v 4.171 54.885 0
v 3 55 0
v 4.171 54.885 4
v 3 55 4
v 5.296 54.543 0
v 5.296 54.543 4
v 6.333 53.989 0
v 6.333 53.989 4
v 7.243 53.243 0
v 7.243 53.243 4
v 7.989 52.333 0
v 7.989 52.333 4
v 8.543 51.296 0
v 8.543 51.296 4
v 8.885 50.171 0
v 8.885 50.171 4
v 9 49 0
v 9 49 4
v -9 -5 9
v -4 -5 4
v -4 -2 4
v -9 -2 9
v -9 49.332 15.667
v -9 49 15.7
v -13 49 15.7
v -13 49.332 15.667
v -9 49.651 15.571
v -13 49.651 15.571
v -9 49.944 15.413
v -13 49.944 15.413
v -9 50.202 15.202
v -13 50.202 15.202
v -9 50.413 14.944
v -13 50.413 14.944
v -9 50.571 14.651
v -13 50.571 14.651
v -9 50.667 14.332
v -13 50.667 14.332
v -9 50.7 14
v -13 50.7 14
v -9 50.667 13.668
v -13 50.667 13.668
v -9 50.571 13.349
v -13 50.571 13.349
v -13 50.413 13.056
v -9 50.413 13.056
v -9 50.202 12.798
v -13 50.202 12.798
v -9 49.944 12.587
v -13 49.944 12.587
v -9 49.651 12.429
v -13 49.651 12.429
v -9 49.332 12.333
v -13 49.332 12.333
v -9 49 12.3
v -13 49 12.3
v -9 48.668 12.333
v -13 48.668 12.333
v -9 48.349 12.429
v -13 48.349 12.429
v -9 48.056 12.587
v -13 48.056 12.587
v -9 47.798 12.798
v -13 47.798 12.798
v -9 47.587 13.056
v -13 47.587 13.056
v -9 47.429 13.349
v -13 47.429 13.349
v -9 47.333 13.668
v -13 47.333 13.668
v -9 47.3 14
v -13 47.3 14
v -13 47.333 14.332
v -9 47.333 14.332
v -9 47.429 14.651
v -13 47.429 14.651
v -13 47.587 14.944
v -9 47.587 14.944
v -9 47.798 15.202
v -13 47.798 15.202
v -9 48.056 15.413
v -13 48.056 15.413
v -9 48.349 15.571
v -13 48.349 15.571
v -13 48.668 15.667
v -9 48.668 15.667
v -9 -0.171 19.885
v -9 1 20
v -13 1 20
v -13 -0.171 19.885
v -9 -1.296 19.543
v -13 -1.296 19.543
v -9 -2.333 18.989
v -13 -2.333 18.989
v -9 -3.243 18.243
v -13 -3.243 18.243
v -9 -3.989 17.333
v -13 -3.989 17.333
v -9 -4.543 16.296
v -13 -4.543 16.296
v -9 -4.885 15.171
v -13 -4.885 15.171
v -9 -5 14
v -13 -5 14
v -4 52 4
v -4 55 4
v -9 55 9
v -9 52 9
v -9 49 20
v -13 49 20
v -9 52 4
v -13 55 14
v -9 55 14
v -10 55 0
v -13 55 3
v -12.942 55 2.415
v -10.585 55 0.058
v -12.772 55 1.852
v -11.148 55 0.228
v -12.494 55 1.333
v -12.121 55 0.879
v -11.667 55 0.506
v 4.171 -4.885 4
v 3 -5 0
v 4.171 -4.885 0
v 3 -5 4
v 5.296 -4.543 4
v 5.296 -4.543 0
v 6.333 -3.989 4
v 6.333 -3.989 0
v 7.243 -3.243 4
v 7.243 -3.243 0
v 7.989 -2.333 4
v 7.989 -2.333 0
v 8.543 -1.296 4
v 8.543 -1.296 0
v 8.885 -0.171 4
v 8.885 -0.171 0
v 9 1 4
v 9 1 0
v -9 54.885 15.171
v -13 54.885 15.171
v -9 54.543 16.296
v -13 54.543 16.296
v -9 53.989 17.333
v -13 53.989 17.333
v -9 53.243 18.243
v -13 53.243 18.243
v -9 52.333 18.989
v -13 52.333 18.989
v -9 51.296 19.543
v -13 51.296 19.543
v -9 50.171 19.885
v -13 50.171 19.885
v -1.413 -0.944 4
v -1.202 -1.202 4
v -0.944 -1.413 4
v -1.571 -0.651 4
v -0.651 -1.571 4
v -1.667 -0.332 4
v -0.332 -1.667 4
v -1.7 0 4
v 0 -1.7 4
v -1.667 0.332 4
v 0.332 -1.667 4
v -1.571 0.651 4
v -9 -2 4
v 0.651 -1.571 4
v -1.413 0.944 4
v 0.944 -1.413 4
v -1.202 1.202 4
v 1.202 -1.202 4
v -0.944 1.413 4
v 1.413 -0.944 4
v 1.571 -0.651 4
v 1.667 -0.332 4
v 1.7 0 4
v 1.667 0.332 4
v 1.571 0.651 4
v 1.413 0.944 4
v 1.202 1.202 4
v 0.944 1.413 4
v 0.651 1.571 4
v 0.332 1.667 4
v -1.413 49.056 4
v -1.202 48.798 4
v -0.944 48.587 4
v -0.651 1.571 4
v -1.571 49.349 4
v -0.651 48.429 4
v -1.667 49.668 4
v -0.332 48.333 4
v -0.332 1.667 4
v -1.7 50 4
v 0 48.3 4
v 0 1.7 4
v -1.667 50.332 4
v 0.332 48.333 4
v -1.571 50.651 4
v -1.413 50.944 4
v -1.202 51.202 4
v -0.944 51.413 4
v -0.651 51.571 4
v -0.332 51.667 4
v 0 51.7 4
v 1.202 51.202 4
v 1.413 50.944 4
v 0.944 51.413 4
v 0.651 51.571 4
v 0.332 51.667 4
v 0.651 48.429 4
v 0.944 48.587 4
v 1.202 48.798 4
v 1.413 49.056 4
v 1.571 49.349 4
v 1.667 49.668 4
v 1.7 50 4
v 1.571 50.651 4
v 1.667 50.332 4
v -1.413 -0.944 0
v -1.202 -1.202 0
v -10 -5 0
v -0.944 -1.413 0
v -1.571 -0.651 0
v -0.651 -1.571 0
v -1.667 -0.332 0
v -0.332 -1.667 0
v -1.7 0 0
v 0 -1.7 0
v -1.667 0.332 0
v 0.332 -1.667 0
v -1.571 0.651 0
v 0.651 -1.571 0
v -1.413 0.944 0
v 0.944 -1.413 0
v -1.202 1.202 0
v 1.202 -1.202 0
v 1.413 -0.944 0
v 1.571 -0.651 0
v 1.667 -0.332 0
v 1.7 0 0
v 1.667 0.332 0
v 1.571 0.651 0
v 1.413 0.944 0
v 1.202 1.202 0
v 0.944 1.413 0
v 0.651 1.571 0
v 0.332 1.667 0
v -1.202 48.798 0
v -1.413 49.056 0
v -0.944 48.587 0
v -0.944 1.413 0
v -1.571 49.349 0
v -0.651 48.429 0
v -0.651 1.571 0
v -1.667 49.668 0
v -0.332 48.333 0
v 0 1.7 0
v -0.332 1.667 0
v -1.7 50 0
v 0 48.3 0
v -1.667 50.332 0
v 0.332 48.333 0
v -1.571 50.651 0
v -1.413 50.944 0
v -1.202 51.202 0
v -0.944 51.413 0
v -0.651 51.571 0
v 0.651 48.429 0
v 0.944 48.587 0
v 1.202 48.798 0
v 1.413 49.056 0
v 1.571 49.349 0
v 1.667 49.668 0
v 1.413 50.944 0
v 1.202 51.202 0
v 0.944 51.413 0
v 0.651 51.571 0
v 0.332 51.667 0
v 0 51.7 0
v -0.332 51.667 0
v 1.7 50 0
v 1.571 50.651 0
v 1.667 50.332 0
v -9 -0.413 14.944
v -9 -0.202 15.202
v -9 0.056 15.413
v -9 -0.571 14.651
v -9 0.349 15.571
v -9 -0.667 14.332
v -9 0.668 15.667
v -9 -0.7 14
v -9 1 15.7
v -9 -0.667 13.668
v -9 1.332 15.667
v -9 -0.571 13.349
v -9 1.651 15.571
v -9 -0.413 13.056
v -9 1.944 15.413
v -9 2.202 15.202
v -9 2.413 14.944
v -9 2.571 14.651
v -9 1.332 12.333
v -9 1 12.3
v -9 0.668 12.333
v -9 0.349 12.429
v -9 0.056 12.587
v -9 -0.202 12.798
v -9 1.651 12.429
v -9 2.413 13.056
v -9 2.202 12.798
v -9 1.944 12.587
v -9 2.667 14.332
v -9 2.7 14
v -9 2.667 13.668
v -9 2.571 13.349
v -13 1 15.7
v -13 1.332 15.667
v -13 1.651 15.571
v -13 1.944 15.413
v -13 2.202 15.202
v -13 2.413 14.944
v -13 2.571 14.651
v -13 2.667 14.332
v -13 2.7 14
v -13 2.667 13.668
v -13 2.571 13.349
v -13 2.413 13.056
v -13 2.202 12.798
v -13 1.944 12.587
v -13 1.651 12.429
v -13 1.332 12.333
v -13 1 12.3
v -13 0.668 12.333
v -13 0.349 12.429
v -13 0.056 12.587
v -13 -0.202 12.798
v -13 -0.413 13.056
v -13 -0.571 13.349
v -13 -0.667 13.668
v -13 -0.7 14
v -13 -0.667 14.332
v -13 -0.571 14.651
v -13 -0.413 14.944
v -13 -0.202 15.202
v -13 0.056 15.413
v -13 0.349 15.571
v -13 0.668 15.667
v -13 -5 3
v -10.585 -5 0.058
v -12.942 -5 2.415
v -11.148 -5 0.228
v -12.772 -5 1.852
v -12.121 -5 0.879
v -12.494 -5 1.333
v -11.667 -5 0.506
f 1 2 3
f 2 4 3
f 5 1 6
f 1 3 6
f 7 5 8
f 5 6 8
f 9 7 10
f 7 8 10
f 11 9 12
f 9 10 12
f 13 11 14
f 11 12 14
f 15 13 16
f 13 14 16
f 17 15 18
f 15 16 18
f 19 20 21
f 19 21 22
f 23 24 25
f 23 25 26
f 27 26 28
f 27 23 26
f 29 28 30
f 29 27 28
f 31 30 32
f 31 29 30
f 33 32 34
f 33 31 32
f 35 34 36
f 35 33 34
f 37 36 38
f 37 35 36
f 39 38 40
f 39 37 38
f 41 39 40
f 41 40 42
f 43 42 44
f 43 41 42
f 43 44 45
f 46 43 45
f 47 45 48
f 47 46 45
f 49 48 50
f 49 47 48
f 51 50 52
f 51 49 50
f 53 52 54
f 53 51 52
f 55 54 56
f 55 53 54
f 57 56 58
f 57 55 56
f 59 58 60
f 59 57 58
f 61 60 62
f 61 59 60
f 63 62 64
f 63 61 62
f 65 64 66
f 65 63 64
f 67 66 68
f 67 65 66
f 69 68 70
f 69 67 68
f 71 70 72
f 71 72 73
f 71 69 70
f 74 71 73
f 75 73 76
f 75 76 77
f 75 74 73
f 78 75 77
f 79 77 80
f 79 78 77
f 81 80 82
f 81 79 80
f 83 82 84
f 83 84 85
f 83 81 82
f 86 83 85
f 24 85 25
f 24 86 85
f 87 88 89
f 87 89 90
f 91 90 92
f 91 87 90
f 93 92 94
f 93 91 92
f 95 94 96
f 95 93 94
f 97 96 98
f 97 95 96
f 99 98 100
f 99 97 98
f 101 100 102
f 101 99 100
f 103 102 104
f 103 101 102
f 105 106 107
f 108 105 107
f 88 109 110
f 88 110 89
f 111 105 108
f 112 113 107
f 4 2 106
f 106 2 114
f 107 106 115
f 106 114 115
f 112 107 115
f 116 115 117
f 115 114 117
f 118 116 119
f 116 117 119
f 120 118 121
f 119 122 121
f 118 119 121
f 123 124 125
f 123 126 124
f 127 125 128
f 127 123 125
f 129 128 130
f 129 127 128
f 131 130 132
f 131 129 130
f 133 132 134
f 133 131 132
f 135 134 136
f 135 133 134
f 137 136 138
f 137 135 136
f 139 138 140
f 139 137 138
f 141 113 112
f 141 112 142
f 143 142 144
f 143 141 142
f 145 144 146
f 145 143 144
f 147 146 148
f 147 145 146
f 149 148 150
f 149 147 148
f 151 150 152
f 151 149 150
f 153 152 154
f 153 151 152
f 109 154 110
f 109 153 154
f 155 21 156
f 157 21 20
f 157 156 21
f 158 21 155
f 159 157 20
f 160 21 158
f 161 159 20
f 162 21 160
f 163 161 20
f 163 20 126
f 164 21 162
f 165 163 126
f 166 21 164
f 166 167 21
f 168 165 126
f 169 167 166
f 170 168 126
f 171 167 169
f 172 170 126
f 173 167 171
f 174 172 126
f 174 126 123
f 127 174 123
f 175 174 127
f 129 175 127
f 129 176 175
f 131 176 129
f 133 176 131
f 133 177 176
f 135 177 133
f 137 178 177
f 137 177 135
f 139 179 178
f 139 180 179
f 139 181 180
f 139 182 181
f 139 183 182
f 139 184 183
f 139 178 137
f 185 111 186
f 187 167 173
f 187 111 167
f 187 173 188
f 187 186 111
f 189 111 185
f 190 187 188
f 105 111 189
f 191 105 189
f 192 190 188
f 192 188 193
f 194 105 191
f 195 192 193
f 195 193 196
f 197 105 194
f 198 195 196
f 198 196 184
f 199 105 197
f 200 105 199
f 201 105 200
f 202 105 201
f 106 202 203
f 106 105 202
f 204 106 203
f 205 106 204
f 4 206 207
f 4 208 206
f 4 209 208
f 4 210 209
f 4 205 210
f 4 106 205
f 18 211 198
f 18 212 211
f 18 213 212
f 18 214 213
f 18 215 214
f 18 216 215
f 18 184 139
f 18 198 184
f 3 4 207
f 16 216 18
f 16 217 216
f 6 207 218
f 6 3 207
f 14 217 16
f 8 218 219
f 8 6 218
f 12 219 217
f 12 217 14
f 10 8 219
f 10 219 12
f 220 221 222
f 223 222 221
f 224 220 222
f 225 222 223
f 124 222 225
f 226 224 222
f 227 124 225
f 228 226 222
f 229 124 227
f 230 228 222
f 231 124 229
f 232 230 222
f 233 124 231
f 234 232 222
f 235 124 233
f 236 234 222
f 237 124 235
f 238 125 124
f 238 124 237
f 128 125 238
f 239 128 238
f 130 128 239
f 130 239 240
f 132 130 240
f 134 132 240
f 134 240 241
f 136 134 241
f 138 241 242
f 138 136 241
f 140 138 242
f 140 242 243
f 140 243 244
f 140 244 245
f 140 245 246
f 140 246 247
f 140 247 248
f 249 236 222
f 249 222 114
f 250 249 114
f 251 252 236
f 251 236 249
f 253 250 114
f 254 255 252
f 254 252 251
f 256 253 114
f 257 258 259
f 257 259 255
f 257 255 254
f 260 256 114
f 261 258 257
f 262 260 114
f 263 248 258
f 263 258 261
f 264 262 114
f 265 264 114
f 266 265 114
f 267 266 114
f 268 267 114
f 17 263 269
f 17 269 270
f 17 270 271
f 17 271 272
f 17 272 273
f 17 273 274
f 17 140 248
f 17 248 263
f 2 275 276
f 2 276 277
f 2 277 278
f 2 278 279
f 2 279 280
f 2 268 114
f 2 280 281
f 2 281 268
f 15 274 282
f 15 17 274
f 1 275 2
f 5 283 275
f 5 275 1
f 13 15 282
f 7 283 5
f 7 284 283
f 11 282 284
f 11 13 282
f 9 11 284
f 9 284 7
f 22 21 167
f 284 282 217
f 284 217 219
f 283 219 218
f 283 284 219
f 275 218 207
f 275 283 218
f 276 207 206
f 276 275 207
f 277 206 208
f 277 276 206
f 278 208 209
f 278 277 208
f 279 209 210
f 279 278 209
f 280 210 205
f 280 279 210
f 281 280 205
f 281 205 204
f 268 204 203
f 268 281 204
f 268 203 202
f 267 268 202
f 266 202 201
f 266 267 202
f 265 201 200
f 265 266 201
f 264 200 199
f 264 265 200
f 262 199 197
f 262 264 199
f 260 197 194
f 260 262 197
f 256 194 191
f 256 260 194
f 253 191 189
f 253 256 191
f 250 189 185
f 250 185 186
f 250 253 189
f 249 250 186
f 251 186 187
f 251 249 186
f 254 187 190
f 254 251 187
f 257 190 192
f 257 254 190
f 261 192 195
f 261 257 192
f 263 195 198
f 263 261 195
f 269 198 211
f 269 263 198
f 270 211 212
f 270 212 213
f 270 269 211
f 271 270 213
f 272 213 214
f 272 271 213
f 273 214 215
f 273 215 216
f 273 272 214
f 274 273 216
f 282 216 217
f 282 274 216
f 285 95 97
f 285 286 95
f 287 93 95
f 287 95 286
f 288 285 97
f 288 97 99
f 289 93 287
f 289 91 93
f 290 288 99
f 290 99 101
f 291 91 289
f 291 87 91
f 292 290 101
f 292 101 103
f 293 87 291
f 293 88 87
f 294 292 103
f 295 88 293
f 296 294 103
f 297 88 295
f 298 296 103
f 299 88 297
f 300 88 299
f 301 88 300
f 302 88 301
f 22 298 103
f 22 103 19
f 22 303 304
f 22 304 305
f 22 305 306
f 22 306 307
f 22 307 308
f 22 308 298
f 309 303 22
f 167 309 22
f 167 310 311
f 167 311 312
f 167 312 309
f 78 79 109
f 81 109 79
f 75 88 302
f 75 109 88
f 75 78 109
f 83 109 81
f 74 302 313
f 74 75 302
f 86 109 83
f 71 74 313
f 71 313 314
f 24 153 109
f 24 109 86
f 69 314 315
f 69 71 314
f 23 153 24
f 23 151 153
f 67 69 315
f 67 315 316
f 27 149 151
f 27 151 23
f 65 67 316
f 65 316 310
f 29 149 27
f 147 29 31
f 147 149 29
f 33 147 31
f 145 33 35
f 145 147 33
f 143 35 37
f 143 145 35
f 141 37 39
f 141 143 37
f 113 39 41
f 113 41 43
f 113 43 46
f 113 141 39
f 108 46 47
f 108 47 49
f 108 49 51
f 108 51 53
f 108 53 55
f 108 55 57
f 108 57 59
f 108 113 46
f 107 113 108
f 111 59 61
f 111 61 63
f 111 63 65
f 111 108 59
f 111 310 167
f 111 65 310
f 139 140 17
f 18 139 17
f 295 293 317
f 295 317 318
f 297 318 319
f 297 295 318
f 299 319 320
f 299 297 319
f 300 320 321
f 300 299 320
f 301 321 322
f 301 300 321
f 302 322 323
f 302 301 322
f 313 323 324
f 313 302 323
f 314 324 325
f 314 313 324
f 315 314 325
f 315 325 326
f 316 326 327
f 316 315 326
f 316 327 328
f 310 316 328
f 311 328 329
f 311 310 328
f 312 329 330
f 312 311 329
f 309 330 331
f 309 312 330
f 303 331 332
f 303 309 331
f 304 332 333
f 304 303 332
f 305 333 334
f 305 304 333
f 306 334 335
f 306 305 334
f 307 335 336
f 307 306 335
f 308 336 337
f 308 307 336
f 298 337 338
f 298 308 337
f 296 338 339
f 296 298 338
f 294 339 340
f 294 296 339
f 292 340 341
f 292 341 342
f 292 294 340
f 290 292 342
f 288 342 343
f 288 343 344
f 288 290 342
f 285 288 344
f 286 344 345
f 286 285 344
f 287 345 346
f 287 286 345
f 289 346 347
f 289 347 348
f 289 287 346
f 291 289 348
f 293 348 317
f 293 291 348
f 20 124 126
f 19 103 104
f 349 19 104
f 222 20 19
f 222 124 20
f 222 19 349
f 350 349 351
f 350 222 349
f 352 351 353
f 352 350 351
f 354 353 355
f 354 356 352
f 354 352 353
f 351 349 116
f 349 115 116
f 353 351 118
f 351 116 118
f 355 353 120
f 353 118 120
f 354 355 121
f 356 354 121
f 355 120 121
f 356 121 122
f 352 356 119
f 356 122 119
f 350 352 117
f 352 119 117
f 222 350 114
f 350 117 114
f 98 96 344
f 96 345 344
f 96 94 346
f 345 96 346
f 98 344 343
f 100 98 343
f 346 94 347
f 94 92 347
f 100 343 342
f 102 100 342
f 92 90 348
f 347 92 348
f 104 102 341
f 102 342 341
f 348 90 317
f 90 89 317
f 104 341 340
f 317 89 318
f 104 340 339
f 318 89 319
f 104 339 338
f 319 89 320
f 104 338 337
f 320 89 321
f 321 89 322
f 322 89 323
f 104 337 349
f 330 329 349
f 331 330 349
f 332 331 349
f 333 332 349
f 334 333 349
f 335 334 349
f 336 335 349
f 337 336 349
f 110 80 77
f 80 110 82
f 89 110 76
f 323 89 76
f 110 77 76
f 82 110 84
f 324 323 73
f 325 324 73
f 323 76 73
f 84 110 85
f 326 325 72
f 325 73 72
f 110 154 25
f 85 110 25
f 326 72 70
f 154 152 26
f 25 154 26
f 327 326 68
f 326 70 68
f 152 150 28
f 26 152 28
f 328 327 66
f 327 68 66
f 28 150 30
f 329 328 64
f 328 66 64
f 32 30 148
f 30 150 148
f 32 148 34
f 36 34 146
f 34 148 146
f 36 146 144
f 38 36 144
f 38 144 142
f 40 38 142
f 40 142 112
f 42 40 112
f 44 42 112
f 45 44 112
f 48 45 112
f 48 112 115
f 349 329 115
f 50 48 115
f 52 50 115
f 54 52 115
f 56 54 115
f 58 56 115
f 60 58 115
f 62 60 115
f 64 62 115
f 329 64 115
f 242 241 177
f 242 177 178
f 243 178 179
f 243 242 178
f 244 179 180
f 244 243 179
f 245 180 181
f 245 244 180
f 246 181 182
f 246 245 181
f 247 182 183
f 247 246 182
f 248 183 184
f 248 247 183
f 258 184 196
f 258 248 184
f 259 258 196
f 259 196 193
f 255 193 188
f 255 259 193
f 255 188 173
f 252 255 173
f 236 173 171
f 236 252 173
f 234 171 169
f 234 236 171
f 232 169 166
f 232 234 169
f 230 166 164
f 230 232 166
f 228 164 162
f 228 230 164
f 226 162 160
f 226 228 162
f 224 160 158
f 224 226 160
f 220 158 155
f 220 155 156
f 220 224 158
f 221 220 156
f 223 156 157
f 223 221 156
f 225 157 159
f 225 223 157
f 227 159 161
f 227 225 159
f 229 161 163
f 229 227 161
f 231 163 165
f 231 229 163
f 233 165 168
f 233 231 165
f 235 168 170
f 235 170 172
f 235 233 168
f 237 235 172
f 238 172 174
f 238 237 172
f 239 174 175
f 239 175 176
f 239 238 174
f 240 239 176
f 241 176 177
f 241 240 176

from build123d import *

# Parameters (mm, degrees)
SKETCH1_W           = 18
SKETCH1_H           = 60
SKETCH1_R           = 1.7
BOSS_EXTRUDE1_DEPTH = 4
SKETCH2_R           = 1.7
BOSS_EXTRUDE2_DEPTH = 4
FILLET1_R           = 6
BOSS_EXTRUDE3_DEPTH = 3
FILLET2_R           = 3


with BuildPart() as part:
    # Sketch1 → Boss-Extrude1 (new body)
    with BuildSketch(Plane.XY):
        with Locations((0, 25)):
            Rectangle(SKETCH1_W, SKETCH1_H)
        Circle(SKETCH1_R, mode=Mode.SUBTRACT)
        with Locations((0, 50)):
            Circle(SKETCH1_R, mode=Mode.SUBTRACT)
    extrude(amount=BOSS_EXTRUDE1_DEPTH)

    # Sketch2 → Boss-Extrude2 (add)
    with BuildSketch(Plane.ZY.offset(9)):
        with BuildLine():
            Line((0, 55), (14, 55))
            ThreePointArc((14, 55), (18.242640687, 53.242640687), (20, 49))
            Line((20, 49), (20, 1))
            ThreePointArc((20, 1), (18.242640687, -3.242640687), (14, -5))
            Line((14, -5), (0, -5))
            Line((0, -5), (0, 55))
        make_face()
        with Locations((14, 49)):
            Circle(SKETCH2_R, mode=Mode.SUBTRACT)
        with Locations((14, 1)):
            Circle(SKETCH2_R, mode=Mode.SUBTRACT)
    extrude(amount=BOSS_EXTRUDE2_DEPTH)

    # Fillet1
    fillet1_edges = [part.edges().sort_by_distance(p)[0] for p in [
        (9, 55, 2),
        (9, -5, 2),
    ]]
    fillet(fillet1_edges, radius=FILLET1_R)

    # Sketch3 → Boss-Extrude3 (add)
    with BuildSketch(Plane(origin=(0, 55, 0), x_dir=(1, 0, 0), z_dir=(0, 1, 0))):
        Polygon((-4, -4), (-9, -9), (-9, -4), align=None)
    boss_extrude3 = extrude(amount=-BOSS_EXTRUDE3_DEPTH)

    # Mirror1: Boss-Extrude3 across plane
    add(boss_extrude3.mirror(Plane.ZX.offset(25)))

    # Fillet2
    fillet2_edges = [part.edges().sort_by_distance(p)[0] for p in [
        (-13, 25, 0),
    ]]
    fillet(fillet2_edges, radius=FILLET2_R)


solid = part.part
